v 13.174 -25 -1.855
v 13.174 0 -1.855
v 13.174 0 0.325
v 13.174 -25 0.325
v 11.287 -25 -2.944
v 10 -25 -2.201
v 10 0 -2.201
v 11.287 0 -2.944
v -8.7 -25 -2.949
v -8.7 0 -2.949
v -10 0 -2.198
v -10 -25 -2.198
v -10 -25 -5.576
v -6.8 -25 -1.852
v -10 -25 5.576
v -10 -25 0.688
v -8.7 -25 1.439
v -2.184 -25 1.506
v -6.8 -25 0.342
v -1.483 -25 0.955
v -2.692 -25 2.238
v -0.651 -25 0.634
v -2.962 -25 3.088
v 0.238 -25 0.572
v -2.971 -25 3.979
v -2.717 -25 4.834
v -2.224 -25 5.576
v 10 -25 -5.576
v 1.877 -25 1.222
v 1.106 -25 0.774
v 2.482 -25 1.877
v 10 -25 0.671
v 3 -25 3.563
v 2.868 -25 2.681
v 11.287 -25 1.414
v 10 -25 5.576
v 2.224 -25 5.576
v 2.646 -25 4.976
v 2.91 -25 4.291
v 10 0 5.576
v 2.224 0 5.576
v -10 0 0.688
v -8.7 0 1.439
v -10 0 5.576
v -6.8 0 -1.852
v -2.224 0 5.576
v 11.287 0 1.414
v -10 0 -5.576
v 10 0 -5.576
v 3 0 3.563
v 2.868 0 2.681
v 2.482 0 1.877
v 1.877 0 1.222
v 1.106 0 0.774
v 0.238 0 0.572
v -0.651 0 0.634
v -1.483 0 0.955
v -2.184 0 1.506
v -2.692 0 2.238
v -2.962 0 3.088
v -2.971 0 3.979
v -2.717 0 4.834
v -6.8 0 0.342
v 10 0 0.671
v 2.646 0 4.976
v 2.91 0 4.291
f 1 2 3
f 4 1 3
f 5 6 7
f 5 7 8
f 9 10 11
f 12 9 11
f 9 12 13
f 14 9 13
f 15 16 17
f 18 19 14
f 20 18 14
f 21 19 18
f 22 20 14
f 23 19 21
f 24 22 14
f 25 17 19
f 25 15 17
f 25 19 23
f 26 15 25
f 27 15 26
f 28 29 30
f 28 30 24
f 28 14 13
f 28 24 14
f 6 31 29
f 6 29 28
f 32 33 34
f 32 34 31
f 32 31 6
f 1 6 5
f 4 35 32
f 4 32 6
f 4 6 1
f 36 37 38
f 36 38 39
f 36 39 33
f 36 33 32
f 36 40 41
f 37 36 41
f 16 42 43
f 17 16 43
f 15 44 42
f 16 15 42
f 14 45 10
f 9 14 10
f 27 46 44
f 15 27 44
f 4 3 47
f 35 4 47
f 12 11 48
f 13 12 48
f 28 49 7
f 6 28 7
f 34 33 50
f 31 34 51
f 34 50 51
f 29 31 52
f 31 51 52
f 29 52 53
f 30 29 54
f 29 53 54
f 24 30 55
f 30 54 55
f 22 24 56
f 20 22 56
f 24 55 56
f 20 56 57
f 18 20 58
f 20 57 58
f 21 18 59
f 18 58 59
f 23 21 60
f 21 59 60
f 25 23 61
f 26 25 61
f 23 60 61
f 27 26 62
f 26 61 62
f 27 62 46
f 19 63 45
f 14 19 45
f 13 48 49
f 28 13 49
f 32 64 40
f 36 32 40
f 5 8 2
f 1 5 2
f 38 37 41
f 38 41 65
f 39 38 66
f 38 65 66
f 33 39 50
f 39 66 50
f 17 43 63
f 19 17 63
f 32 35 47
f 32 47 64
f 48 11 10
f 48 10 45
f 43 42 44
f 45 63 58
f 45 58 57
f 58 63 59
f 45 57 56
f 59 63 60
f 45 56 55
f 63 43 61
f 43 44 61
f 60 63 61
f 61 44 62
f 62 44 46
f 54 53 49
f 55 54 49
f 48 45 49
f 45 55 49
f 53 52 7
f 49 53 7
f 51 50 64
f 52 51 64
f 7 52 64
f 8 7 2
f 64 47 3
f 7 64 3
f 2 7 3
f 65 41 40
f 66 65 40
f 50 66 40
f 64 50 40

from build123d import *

# Parameters (mm, degrees)
F1_DEPTH = 25


# Not quite as in the source:
# - a feature names something its author has since deleted; it is built from what else it names


with BuildPart() as f1:
    # F0 (on Front) → F1 (new body)
    with BuildSketch(Plane.XZ):
        with BuildLine():
            Line((-10, -5.576437097), (10, -5.576437097))
            Line((10, -5.576437097), (10, -2.201012618))
            Line((10, -2.201012618), (9.4, -1.8546024565))
            Line((9.4, -1.8546024565), (9.4, 0.3245011641))
            Line((9.4, 0.3245011641), (10, 0.6709113256))
            Line((10, 0.6709113256), (10, 5.576437097))
            Line((10, 5.576437097), (2.2236531144, 5.576437097))
            ThreePointArc((2.2236531144, 5.576437097), (2.7991926821, 4.6417723907), (3, 3.5626429599))
            ThreePointArc((3, 3.5626429599), (-1.0791294308, 0.7634502778), (-2.2236531144, 5.576437097))
            Line((-2.2236531144, 5.576437097), (-10, 5.576437097))
            Line((-10, 5.576437097), (-10, 0.6884473353))
            Line((-10, 0.6884473353), (-8.6999533325, 1.4390296287))
            Line((-8.6999533325, 1.4390296287), (-6.7999051139, 0.3420362782))
            Line((-6.7999051139, 0.3420362782), (-6.7999051139, -1.8519504229))
            Line((-6.7999051139, -1.8519504229), (-8.6999533325, -2.9489437734))
            Line((-8.6999533325, -2.9489437734), (-10, -2.19836148))
            Line((-10, -2.19836148), (-10, -5.576437097))
        make_face()
        Polygon((10, 0.6709113256), (10, -2.201012618), (11.2871590928, -2.9441542667), (13.1743181857, -1.8546024565), (13.1743181857, 0.3245011641), (11.2871590928, 1.4140529743), align=None)
        Polygon((9.4, -1.8546024565), (10, -2.201012618), (10, 0.6709113256), (9.4, 0.3245011641), align=None)
    extrude(amount=F1_DEPTH)


solid = f1.part
